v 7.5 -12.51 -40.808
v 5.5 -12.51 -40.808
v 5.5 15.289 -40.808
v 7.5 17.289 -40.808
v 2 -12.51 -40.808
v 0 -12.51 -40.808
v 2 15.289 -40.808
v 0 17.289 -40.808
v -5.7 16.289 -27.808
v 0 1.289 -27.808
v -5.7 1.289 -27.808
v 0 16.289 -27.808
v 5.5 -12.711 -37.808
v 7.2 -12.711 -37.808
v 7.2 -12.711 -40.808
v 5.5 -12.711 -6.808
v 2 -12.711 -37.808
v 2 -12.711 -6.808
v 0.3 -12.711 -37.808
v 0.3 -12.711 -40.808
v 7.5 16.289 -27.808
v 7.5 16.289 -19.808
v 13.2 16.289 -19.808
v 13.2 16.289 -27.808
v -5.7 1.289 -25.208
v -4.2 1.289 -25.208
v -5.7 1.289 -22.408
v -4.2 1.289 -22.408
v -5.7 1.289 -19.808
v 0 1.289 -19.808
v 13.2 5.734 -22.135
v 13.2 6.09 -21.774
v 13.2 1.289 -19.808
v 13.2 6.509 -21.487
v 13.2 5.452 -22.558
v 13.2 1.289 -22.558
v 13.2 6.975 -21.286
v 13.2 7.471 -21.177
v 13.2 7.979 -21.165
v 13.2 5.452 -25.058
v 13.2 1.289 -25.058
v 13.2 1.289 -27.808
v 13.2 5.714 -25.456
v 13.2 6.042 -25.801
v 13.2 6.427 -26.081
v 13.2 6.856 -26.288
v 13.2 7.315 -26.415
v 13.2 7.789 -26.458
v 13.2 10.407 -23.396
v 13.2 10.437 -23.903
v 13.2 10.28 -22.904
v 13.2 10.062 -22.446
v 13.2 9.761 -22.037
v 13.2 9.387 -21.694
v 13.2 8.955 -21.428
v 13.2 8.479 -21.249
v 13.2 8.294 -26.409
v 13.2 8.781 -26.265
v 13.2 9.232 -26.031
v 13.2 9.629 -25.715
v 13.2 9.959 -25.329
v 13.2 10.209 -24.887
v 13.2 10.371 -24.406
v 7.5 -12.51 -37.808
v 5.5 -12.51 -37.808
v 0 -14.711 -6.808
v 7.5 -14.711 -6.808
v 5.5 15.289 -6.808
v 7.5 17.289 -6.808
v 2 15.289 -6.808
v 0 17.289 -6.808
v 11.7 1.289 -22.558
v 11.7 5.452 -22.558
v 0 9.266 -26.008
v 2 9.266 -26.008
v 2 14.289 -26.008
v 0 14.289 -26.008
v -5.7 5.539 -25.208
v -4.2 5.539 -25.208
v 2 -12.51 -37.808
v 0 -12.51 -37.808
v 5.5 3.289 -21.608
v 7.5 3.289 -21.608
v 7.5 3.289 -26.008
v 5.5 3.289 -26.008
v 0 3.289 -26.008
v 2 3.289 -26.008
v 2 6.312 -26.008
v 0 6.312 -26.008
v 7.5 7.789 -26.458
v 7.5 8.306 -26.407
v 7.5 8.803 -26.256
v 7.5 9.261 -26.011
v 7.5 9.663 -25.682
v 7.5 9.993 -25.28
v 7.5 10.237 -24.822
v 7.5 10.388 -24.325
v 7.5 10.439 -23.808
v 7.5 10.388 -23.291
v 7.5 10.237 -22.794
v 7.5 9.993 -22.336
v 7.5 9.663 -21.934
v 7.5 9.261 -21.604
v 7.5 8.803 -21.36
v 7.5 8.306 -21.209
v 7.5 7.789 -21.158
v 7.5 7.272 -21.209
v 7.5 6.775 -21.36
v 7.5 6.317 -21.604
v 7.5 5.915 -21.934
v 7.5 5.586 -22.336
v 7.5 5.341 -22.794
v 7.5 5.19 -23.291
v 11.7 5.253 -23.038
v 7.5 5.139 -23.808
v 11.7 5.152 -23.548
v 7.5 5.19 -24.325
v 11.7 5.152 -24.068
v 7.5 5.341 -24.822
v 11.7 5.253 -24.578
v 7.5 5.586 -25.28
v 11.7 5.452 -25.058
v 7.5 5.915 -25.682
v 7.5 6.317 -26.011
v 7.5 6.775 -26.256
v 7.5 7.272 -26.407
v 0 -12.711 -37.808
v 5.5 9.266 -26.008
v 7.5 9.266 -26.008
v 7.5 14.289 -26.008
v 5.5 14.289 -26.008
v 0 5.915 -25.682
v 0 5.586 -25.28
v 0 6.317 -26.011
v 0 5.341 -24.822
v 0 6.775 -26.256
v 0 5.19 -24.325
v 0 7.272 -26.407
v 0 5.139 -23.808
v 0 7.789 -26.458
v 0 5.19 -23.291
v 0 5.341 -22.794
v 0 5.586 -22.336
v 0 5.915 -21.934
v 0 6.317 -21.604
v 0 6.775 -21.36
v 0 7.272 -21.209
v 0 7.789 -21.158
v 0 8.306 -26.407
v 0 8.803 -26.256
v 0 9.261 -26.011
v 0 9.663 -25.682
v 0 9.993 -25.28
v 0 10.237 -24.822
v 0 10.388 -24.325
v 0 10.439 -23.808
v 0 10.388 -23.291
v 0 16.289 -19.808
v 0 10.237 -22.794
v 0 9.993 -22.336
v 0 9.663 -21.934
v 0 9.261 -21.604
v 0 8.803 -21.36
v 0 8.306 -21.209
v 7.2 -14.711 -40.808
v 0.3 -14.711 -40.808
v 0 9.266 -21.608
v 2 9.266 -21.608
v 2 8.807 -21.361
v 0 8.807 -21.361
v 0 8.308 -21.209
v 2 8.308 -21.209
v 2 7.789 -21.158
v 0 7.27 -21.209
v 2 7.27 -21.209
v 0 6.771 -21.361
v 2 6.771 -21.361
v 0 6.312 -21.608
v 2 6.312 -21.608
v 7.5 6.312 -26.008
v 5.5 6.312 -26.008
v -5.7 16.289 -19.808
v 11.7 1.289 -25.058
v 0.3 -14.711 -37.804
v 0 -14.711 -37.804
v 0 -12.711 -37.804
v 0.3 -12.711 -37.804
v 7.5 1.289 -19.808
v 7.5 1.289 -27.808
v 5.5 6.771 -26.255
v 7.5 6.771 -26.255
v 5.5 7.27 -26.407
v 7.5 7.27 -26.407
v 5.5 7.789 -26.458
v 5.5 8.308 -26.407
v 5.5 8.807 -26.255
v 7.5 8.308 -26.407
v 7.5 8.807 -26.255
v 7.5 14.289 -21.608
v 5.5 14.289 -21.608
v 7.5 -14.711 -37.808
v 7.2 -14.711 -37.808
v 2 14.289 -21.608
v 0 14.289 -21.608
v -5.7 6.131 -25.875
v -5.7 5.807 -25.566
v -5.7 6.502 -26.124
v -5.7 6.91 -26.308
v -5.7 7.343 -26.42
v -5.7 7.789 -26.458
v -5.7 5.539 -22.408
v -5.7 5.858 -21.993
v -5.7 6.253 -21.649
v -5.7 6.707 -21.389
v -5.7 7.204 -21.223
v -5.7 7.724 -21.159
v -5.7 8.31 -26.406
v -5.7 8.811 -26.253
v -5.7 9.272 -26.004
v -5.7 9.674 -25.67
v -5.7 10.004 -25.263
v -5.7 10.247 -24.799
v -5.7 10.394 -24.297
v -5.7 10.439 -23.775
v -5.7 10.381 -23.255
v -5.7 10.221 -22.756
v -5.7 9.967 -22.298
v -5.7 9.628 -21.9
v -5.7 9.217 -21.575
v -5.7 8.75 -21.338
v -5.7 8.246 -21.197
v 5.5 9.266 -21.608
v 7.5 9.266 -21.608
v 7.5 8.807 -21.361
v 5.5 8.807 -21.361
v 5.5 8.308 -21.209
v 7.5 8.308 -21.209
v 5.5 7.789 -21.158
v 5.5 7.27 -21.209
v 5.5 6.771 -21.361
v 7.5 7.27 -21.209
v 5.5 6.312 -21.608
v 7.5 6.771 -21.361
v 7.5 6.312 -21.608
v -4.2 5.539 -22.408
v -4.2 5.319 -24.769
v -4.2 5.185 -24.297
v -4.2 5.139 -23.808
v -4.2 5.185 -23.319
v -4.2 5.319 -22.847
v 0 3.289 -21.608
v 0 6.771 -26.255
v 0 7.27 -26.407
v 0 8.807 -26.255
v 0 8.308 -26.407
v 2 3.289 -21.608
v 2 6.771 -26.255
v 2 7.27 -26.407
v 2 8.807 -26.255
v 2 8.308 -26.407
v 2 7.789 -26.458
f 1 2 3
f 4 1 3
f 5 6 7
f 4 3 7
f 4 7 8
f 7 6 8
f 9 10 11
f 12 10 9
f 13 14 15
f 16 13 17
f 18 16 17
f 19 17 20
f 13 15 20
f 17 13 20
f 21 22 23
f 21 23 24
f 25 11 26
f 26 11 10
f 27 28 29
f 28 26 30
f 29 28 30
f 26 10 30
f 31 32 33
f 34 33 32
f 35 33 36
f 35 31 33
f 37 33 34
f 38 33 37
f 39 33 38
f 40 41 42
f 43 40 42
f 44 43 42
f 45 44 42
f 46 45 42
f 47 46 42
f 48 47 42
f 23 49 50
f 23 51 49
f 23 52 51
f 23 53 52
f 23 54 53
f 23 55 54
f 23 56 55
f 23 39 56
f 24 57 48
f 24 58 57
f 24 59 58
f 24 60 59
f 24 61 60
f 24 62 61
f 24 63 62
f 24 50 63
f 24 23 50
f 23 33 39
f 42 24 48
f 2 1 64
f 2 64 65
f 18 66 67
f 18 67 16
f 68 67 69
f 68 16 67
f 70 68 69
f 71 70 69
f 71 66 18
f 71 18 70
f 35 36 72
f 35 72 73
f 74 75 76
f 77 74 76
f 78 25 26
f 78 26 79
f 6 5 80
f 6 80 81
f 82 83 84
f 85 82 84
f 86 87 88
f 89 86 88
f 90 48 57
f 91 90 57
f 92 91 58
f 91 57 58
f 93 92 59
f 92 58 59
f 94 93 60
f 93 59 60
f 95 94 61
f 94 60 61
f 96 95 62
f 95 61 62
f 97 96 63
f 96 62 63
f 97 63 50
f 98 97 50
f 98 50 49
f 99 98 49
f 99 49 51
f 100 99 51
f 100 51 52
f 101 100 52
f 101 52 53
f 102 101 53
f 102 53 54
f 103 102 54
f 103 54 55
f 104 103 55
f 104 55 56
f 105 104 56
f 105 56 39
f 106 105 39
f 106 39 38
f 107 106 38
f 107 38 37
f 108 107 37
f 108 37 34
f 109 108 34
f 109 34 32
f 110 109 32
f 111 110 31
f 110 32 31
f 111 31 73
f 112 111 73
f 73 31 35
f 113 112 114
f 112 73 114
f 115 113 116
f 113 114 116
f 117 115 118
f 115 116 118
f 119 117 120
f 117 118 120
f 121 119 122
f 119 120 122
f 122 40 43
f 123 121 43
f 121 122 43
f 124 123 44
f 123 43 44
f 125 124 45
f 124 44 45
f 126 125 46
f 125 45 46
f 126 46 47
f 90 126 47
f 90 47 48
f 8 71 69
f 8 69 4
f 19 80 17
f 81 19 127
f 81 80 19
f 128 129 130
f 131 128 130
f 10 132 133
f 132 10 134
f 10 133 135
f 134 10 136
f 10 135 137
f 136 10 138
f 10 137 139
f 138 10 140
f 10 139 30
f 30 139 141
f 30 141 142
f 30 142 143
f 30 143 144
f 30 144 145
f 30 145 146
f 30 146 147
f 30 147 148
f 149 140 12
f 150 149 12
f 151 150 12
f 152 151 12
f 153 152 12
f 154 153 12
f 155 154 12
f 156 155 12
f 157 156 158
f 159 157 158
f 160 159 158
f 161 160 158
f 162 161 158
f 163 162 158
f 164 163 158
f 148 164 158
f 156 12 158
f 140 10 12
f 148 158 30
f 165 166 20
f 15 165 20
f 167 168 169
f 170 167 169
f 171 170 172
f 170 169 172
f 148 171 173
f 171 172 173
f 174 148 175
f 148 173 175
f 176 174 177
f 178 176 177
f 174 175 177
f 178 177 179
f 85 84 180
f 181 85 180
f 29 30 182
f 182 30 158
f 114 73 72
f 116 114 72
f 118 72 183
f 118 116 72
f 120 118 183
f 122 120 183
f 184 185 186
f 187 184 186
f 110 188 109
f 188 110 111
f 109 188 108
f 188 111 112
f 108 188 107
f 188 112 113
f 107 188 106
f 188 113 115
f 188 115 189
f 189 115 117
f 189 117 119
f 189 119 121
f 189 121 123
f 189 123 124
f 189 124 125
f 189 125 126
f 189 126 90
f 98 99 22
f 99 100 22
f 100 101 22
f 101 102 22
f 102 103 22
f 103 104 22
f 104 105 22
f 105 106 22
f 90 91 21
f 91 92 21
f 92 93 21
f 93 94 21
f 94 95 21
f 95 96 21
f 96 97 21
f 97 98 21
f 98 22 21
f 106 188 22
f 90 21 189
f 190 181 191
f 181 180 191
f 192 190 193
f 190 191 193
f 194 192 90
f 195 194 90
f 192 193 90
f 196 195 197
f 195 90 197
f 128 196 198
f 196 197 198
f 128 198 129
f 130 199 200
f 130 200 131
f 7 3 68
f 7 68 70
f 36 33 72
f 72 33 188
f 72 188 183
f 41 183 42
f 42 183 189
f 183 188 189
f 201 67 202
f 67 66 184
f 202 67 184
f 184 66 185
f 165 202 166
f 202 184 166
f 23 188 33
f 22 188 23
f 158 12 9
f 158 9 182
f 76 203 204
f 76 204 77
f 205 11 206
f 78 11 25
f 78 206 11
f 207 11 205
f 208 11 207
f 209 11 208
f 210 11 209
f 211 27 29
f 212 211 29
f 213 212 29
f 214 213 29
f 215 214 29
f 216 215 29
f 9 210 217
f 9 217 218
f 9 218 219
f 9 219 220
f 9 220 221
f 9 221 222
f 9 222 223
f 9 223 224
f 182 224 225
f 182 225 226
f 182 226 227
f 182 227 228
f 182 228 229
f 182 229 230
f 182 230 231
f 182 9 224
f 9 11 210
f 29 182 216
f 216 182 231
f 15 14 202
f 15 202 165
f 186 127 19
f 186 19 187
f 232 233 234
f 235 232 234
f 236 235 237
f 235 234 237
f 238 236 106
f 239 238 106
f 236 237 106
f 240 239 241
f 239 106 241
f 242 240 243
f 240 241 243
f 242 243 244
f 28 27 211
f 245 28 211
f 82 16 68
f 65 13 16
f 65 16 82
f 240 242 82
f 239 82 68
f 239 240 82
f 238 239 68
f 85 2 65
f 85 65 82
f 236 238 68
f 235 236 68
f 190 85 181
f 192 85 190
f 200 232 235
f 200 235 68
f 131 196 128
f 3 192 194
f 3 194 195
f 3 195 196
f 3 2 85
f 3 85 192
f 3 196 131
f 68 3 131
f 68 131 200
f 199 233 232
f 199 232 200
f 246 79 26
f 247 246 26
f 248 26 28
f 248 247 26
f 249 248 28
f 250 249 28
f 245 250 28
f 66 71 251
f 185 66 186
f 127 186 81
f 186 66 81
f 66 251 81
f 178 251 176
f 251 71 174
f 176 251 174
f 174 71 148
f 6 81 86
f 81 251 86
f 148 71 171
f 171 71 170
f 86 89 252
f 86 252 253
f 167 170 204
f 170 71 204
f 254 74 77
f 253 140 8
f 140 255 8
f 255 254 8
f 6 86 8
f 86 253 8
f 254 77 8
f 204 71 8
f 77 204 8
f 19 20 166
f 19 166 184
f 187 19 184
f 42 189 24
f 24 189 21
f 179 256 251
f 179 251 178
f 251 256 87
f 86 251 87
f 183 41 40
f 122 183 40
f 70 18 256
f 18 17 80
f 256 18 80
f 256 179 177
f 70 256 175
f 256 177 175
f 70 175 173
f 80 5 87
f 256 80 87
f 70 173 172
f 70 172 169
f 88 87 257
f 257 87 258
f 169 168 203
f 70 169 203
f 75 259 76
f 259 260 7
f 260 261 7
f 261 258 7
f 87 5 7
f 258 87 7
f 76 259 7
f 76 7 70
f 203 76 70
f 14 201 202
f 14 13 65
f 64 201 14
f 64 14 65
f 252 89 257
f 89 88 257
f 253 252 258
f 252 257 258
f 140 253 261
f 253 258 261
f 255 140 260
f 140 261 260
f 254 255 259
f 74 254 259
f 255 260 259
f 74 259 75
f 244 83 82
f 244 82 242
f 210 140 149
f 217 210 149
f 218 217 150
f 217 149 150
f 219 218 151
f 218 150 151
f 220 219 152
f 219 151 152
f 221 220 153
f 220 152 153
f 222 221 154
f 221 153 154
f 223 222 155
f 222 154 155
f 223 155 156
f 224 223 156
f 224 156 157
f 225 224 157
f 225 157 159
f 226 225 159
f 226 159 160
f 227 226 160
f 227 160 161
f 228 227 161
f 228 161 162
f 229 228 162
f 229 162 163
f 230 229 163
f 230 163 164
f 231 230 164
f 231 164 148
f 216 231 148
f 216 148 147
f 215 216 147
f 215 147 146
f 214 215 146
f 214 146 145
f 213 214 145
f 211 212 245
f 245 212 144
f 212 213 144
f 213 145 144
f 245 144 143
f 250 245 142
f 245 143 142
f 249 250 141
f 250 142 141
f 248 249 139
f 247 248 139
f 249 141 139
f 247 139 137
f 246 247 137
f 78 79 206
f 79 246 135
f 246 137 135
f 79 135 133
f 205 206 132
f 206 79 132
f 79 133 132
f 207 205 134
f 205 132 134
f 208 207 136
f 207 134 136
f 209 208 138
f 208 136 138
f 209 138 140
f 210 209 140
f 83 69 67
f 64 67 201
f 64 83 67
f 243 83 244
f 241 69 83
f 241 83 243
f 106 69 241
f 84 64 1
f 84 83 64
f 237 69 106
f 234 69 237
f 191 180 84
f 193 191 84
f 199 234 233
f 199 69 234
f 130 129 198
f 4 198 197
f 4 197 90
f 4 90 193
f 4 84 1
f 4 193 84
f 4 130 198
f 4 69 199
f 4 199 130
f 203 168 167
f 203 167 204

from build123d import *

# Parameters (mm, degrees)
SKETCH_1_W           = 34
SKETCH_1_H           = 32
EXTRUDE_1_DEPTH      = 7.5
SKETCH_2_W           = 3.5
SKETCH_2_H           = 28
CUT_EXTRUDE_1_DEPTH  = 34
SKETCH_3_W           = 4.4
SKETCH_3_H           = 11
CUT_EXTRUDE_2_DEPTH  = 45.949358405
SKETCH_5_W           = 8
SKETCH_5_H           = 15
EXTRUDE_2_DEPTH      = 5.7
SKETCH_7_W           = 8
SKETCH_7_H           = 15
EXTRUDE_3_DEPTH      = 5.7
SKETCH_9_R           = 2.65
CUT_EXTRUDE_5_DEPTH  = 49.180959113
SKETCH_13_W          = 2.8
SKETCH_13_H          = 4.315717283
CUT_EXTRUDE_6_DEPTH  = 1.5
SKETCH_14_W          = 2.5
SKETCH_14_H          = 4.377857335
CUT_EXTRUDE_7_DEPTH  = 1.5
SKETCH_15_W          = 2
SKETCH_15_H          = 0.201258068
CUT_EXTRUDE_8_DEPTH  = 3
SKETCH_16_W          = 3.003569047
SKETCH_16_H          = 2
CUT_EXTRUDE_9_DEPTH  = 0.3
SKETCH_17_W          = 3
SKETCH_17_H          = 2
CUT_EXTRUDE_10_DEPTH = 0.3


with BuildPart() as part:
    # Эскиз1 → Бобышка-Вытянуть1 (new body)
    with BuildSketch(Plane(origin=(0, 0, 0), x_dir=(0, 0, -1), z_dir=(1, 0, 0))):
        with Locations((23.807859897, 1.28911194)):
            Rectangle(SKETCH_1_W, SKETCH_1_H)
    extrude(amount=EXTRUDE_1_DEPTH)

    # Эскиз2 → Вырез-Вытянуть1 (cut)
    with BuildSketch(Plane(origin=(0, 0, -40.807859897), x_dir=(-1, 0, 0), z_dir=(0, 0, -1))):
        with Locations((-3.75, 1.28911194)):
            Rectangle(SKETCH_2_W, SKETCH_2_H)
    extrude(amount=-CUT_EXTRUDE_1_DEPTH, mode=Mode.SUBTRACT)

    # Эскиз3 → Вырез-Вытянуть2 (cut, through all)
    with BuildSketch(Plane(origin=(7.5, 0, 0), x_dir=(0, 0, -1), z_dir=(1, 0, 0))):
        with Locations((23.807859897, 8.78911194)):
            Rectangle(SKETCH_3_W, SKETCH_3_H)
    extrude(amount=-CUT_EXTRUDE_2_DEPTH, mode=Mode.SUBTRACT)


with BuildPart() as body_2:
    # Эскиз5 → Бобышка-Вытянуть2 (new body)
    with BuildSketch(Plane(origin=(7.5, 0, 0), x_dir=(0, 0, -1), z_dir=(1, 0, 0))):
        with Locations((23.807859897, 8.78911194)):
            Rectangle(SKETCH_5_W, SKETCH_5_H)
    extrude(amount=EXTRUDE_2_DEPTH)


with BuildPart() as body_3:
    # Эскиз7 → Бобышка-Вытянуть3 (new body)
    with BuildSketch(Plane.ZY):
        with Locations((-23.807859897, 8.78911194)):
            Rectangle(SKETCH_7_W, SKETCH_7_H)
    extrude(amount=EXTRUDE_3_DEPTH)


with BuildPart() as cut_extrude_5_tool:
    # Эскиз9 → Вырез-Вытянуть5 (new, through all)
    with BuildSketch(Plane(origin=(13.2, 0, 0), x_dir=(0, 0, -1), z_dir=(1, 0, 0))):
        with Locations((23.807859897, 7.78911194)):
            Circle(SKETCH_9_R)
    extrude(amount=-CUT_EXTRUDE_5_DEPTH)


with BuildPart() as part_1:
    add(part.part)

    # Вырез-Вытянуть5: cut by cut_extrude_5_tool
    add(cut_extrude_5_tool.part, mode=Mode.SUBTRACT)

    # Эскиз15 → Вырез-Вытянуть8 (cut)
    with BuildSketch(Plane(origin=(0, 0, -40.807859897), x_dir=(-1, 0, 0), z_dir=(0, 0, -1))):
        with Locations((-6.5, -12.610259026)):
            Rectangle(SKETCH_15_W, SKETCH_15_H)
        with Locations((-1, -12.610259026)):
            Rectangle(SKETCH_15_W, SKETCH_15_H)
    extrude(amount=-CUT_EXTRUDE_8_DEPTH, mode=Mode.SUBTRACT)

    # Эскиз16 → Вырез-Вытянуть9 (cut)
    with BuildSketch(Plane.ZY):
        with Locations((-39.306075374, -13.71088806)):
            Rectangle(SKETCH_16_W, SKETCH_16_H)
    extrude(amount=-CUT_EXTRUDE_9_DEPTH, mode=Mode.SUBTRACT)

    # Эскиз17 → Вырез-Вытянуть10 (cut)
    with BuildSketch(Plane(origin=(7.5, 0, 0), x_dir=(0, 0, -1), z_dir=(1, 0, 0))):
        with Locations((39.307859897, -13.71088806)):
            Rectangle(SKETCH_17_W, SKETCH_17_H)
    extrude(amount=-CUT_EXTRUDE_10_DEPTH, mode=Mode.SUBTRACT)


with BuildPart() as body_2_1:
    add(body_2.part)

    # Вырез-Вытянуть5: cut by cut_extrude_5_tool
    add(cut_extrude_5_tool.part, mode=Mode.SUBTRACT)

    # Эскиз14 → Вырез-Вытянуть7 (cut)
    with BuildSketch(Plane(origin=(13.2, 0, 0), x_dir=(0, 0, -1), z_dir=(1, 0, 0))):
        with Locations((23.807859897, 3.343648644)):
            Rectangle(SKETCH_14_W, SKETCH_14_H)
    extrude(amount=-CUT_EXTRUDE_7_DEPTH, mode=Mode.SUBTRACT)


with BuildPart() as body_3_1:
    add(body_3.part)

    # Вырез-Вытянуть5: cut by cut_extrude_5_tool
    add(cut_extrude_5_tool.part, mode=Mode.SUBTRACT)

    # Эскиз13 → Вырез-Вытянуть6 (cut)
    with BuildSketch(Plane.ZY.offset(5.7)):
        with Locations((-23.807859897, 3.393235991)):
            Rectangle(SKETCH_13_W, SKETCH_13_H)
    extrude(amount=-CUT_EXTRUDE_6_DEPTH, mode=Mode.SUBTRACT)


solid = Compound([part_1.part, body_2_1.part, body_3_1.part])
